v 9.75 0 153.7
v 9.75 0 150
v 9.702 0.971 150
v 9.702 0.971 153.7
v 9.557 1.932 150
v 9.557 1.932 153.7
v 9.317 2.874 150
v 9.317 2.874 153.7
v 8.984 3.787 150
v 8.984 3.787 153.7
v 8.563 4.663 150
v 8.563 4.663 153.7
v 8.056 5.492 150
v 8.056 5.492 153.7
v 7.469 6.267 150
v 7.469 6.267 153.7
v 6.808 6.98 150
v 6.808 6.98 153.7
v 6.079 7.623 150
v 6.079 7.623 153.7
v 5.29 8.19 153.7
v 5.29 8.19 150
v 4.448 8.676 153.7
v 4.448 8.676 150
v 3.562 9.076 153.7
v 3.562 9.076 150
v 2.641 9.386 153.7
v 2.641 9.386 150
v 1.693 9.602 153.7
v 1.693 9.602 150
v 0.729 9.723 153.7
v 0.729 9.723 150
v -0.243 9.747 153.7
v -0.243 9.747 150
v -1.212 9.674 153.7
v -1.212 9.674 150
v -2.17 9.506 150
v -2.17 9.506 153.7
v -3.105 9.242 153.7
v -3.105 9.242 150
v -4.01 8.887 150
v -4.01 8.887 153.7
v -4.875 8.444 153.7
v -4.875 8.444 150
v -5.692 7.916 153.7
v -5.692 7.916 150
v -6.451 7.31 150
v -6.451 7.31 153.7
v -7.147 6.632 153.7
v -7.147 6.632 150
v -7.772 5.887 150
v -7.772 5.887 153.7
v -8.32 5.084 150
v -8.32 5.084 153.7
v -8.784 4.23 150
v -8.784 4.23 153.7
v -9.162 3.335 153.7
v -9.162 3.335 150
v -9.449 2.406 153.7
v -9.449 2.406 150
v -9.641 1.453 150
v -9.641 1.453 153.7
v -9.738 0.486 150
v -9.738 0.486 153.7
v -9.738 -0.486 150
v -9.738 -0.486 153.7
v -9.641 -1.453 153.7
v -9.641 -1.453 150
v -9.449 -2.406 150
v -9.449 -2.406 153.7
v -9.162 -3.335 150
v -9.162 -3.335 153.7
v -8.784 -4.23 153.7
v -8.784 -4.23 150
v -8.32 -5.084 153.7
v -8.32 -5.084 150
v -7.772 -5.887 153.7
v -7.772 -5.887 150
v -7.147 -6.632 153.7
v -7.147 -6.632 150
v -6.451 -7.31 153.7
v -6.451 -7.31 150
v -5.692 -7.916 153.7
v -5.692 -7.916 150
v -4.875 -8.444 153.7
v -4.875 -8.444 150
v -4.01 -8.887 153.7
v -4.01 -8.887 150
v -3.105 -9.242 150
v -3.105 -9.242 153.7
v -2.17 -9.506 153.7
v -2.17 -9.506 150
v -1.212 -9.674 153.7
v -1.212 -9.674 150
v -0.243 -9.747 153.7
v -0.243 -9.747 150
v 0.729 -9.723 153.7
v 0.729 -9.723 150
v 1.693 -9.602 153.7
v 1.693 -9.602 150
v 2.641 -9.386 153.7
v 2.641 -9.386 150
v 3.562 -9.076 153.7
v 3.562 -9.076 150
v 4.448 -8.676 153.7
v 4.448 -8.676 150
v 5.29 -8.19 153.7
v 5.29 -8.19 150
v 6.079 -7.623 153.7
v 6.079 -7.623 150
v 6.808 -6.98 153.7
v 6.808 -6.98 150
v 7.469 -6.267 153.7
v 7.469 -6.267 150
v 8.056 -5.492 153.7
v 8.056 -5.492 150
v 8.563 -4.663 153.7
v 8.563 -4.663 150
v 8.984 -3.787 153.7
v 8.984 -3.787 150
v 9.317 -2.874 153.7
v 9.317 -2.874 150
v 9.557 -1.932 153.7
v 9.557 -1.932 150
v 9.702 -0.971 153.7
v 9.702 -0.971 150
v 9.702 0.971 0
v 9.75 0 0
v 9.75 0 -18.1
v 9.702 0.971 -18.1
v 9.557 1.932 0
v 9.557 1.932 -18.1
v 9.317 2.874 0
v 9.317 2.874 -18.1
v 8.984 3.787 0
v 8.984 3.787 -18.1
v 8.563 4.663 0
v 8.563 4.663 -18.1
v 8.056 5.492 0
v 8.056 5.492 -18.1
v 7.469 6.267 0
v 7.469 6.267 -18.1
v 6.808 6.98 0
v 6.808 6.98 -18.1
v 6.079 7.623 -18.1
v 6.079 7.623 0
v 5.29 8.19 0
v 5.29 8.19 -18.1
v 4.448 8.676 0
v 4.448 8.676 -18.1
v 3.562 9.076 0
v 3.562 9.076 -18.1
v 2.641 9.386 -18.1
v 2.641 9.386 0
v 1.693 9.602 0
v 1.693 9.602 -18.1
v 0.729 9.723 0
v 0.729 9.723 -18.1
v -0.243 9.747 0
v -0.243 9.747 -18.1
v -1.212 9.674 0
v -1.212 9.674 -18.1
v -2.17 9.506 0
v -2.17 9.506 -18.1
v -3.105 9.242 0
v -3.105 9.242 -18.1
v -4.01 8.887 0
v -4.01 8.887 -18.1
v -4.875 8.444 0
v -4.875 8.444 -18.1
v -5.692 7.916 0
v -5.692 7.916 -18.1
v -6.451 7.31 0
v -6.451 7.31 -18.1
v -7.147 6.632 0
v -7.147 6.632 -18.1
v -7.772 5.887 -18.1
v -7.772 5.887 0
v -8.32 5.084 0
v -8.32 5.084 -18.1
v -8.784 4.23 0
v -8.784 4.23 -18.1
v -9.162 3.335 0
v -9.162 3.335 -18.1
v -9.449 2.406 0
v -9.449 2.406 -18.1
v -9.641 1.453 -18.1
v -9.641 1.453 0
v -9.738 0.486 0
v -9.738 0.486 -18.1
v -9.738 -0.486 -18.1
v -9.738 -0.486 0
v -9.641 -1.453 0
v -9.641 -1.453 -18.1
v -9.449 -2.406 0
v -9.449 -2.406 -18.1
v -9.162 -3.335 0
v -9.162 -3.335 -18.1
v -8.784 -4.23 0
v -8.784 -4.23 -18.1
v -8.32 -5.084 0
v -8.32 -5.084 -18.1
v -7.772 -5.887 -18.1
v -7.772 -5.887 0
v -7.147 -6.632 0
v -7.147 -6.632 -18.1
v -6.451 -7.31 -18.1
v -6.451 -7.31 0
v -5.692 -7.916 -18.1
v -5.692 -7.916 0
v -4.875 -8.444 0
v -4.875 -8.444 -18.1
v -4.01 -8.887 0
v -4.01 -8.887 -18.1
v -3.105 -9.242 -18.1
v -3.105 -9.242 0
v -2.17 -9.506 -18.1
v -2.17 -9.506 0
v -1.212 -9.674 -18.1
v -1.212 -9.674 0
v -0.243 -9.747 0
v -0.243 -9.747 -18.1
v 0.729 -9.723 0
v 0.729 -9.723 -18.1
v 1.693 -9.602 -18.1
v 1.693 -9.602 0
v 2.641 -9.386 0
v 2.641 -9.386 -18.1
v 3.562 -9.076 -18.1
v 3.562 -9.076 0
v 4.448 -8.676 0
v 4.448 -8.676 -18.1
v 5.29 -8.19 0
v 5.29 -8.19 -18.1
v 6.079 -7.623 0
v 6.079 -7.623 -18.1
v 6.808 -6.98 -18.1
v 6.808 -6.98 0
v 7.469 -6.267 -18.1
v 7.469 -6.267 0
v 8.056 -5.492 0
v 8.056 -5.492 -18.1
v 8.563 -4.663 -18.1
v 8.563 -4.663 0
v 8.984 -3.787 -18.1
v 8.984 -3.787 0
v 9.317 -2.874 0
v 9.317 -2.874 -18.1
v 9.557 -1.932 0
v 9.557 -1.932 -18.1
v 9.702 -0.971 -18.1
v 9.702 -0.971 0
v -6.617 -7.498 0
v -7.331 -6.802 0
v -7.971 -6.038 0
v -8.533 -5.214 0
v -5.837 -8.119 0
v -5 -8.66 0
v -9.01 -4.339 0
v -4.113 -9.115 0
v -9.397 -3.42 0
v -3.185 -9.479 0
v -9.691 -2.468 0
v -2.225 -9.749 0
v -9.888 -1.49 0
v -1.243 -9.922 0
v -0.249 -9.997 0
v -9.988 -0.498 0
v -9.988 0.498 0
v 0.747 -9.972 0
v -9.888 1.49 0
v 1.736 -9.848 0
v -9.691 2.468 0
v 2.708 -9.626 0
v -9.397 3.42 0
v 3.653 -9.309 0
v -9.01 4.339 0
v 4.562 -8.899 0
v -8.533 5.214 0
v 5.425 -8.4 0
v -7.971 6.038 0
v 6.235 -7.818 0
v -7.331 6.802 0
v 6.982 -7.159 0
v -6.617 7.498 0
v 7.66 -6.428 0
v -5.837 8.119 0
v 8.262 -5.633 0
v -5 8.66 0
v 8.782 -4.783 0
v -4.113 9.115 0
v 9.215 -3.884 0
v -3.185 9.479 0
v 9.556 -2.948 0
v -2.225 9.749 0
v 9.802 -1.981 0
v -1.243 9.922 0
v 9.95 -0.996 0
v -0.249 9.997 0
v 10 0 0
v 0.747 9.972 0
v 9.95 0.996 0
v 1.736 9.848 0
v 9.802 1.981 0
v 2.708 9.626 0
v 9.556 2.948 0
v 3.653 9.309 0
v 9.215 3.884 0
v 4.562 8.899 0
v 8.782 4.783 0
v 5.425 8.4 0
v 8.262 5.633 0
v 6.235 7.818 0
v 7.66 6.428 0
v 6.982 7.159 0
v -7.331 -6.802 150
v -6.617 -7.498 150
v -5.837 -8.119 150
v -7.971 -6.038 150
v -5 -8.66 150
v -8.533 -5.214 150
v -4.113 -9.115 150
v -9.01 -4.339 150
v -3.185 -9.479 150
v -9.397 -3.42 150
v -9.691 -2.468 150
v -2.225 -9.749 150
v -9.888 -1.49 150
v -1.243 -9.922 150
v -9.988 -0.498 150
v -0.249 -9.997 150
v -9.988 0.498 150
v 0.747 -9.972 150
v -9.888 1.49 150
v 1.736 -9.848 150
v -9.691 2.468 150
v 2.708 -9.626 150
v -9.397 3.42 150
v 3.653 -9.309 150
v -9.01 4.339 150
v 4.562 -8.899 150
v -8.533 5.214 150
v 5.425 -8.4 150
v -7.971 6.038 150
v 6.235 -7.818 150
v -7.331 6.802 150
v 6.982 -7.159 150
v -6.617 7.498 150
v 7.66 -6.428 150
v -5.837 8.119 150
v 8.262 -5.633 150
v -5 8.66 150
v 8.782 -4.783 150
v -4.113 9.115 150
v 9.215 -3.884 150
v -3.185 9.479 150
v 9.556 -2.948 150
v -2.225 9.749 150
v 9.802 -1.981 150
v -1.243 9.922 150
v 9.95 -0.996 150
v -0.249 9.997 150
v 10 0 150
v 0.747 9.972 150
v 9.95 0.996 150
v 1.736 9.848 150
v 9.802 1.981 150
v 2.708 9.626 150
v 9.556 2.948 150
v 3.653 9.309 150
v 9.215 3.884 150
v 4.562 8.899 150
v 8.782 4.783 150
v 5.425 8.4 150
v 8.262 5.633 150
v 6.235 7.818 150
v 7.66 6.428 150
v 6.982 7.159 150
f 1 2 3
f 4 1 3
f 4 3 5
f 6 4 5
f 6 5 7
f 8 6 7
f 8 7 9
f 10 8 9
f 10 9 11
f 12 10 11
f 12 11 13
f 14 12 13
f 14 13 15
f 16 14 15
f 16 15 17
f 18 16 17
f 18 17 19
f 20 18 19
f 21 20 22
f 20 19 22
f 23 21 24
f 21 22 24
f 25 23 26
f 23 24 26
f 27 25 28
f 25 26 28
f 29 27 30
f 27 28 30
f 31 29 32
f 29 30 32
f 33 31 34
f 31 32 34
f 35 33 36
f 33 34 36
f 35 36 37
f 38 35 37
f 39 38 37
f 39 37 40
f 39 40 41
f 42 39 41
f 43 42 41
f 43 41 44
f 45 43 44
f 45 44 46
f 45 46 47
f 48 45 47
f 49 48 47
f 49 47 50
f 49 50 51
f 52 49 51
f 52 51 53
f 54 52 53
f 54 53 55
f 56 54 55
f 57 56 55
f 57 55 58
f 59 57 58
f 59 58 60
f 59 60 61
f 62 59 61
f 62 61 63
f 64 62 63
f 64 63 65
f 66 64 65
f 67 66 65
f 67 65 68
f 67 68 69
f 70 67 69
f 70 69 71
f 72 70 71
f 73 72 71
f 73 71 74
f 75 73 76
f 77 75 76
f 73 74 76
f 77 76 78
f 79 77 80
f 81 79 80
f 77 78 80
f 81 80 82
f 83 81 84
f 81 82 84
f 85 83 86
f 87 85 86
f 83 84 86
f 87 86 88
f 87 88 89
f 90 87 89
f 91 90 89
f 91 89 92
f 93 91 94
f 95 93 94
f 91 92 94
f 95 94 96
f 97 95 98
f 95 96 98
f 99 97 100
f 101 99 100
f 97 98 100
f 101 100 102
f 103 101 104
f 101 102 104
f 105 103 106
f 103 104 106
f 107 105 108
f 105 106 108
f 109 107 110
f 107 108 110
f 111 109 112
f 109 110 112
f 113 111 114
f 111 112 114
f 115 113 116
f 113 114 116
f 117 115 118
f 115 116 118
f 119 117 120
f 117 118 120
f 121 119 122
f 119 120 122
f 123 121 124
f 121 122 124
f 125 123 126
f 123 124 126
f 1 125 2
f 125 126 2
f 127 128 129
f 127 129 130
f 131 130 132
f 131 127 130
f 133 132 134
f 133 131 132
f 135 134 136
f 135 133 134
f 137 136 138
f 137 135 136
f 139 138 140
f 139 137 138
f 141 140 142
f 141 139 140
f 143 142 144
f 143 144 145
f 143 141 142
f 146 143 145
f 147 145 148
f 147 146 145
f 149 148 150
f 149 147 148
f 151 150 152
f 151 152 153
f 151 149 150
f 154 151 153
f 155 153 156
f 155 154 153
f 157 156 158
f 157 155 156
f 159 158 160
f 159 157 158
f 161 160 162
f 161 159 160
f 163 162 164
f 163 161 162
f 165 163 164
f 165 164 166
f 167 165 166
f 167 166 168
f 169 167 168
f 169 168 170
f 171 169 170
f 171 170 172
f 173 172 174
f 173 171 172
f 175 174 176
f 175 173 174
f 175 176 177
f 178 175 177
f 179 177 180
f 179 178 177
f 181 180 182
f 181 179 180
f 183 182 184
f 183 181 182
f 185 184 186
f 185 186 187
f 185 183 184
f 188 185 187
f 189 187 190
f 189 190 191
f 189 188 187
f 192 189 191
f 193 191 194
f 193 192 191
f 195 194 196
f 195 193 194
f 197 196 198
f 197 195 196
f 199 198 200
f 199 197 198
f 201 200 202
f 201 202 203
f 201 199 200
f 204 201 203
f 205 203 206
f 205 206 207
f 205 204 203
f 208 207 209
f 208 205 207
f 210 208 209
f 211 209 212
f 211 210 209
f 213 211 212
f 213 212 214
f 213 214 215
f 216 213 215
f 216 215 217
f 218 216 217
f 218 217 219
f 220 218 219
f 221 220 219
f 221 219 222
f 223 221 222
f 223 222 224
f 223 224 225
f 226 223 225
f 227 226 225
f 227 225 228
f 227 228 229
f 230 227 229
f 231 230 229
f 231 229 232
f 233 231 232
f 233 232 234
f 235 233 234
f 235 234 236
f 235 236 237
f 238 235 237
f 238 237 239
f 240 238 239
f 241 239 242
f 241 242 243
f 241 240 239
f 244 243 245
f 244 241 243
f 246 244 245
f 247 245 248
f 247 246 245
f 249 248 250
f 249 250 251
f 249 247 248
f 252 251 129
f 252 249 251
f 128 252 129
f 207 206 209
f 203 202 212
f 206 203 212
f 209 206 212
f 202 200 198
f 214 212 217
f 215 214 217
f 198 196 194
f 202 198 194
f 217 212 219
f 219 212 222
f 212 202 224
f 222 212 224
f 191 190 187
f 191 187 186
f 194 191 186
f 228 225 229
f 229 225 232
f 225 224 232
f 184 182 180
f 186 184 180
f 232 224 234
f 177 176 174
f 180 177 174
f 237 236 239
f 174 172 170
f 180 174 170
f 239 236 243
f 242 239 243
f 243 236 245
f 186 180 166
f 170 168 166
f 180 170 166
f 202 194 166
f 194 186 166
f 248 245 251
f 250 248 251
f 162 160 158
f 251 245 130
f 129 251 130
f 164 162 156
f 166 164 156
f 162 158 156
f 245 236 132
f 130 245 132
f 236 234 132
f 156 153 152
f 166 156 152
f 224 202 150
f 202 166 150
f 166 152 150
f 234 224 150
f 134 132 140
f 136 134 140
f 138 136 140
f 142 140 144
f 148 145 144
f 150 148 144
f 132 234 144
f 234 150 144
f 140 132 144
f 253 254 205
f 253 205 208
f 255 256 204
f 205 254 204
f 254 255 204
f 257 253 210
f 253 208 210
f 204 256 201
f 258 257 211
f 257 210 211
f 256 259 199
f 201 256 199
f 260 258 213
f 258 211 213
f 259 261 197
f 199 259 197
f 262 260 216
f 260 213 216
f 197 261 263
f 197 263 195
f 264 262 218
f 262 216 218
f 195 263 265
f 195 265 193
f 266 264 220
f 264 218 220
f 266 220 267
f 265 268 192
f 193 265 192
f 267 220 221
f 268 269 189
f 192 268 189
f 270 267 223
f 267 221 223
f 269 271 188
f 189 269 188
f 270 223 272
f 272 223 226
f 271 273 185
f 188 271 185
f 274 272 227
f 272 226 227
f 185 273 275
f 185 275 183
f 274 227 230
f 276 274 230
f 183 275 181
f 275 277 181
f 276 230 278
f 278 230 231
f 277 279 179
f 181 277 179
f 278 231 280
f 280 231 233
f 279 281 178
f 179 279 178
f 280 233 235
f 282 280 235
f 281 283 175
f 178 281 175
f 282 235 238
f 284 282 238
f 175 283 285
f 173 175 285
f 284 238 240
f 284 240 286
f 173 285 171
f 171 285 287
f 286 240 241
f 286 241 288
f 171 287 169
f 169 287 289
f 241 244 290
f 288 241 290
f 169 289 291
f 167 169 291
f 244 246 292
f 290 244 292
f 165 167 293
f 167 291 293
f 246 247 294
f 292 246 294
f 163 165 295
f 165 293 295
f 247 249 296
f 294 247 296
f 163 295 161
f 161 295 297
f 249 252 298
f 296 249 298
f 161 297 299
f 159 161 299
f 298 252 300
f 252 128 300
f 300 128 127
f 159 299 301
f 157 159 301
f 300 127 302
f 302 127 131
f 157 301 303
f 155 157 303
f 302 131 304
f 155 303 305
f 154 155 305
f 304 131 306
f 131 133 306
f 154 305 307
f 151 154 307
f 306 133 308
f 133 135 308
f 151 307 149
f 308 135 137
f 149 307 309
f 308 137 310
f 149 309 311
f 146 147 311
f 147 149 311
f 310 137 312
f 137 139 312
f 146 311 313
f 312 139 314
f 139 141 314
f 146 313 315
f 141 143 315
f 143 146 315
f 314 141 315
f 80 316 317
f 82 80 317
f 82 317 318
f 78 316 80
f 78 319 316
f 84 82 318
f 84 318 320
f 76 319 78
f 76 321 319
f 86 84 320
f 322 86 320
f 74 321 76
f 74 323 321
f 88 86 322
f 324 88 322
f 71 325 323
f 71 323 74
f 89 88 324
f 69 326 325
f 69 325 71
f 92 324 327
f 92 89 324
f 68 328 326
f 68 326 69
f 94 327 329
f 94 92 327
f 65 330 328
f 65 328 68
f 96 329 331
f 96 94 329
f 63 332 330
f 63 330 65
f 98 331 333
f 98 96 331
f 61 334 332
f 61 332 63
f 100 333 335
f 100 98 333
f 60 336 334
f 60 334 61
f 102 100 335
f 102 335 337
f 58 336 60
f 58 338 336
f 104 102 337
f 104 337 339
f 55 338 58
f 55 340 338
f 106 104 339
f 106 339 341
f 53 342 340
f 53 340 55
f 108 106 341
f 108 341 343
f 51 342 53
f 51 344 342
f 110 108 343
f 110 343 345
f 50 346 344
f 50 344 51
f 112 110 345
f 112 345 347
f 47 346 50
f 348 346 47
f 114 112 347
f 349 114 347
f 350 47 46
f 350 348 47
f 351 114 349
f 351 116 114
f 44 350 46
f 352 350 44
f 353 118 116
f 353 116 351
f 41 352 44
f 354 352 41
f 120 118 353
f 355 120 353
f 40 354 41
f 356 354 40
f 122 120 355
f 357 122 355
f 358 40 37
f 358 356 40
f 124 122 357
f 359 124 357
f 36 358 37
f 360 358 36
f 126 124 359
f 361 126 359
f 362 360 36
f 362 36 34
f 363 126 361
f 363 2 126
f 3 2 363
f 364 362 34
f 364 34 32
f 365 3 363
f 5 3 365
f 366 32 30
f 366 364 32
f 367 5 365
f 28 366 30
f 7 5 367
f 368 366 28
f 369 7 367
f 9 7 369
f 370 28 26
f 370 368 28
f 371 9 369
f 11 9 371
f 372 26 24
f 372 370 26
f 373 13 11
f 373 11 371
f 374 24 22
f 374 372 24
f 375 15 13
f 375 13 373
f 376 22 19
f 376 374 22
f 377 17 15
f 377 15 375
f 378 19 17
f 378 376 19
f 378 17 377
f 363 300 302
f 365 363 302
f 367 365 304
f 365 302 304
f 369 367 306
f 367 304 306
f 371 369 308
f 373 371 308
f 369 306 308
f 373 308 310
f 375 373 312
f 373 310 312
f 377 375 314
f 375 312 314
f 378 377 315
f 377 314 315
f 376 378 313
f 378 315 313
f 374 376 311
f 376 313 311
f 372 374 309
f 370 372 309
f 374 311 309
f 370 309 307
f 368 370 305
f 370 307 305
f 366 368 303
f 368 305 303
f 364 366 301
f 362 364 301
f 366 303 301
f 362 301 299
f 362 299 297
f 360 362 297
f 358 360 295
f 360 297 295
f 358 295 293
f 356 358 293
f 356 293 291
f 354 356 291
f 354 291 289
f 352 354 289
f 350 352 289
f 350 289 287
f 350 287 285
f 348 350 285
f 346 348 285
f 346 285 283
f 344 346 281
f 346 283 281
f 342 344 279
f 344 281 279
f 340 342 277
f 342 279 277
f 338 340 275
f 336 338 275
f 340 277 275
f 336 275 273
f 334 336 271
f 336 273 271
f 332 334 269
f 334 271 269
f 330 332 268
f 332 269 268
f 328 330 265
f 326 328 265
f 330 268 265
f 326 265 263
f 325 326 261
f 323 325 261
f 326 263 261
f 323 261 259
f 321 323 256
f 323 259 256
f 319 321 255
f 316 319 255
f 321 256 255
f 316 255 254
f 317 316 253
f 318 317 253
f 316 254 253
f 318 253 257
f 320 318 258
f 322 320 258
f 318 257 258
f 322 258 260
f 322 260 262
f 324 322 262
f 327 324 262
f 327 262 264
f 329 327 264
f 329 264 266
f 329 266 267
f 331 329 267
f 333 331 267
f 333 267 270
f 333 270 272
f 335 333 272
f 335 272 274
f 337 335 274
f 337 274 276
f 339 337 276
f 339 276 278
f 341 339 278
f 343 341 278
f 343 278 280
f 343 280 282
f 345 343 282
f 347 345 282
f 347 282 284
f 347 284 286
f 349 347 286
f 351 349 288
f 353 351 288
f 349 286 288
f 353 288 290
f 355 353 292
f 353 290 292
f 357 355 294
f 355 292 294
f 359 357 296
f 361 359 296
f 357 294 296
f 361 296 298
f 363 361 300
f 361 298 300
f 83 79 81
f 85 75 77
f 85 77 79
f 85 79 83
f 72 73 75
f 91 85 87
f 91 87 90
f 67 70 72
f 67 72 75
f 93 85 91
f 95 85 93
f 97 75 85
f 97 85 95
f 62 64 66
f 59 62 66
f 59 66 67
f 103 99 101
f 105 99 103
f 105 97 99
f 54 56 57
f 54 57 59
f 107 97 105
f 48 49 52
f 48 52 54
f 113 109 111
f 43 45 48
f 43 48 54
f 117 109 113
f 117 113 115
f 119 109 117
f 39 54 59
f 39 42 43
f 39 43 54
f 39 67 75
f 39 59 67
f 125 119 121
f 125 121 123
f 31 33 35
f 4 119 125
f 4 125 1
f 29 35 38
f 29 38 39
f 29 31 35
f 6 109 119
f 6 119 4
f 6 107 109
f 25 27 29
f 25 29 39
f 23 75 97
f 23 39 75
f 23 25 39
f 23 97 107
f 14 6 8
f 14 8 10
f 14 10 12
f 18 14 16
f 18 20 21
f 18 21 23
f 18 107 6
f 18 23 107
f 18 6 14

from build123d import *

# Parameters (mm, degrees)
F0_R          = 10
F1_DEPTH      = 150
F2_R          = 9.75
F3_DEPTH      = 153.7
F3_DEPTH_BACK = 18.1


with BuildPart() as f1:
    # F0 (on Top) → F1 (new body)
    with BuildSketch(Plane.XY):
        Circle(F0_R)
    extrude(amount=F1_DEPTH)

    # F2 (on Top) → F3 (join, two sides)
    with BuildSketch(Plane.XY) as f3_sk:
        Circle(F2_R)
    extrude(amount=F3_DEPTH)
    extrude(f3_sk.sketch, amount=-F3_DEPTH_BACK)


solid = f1.part
